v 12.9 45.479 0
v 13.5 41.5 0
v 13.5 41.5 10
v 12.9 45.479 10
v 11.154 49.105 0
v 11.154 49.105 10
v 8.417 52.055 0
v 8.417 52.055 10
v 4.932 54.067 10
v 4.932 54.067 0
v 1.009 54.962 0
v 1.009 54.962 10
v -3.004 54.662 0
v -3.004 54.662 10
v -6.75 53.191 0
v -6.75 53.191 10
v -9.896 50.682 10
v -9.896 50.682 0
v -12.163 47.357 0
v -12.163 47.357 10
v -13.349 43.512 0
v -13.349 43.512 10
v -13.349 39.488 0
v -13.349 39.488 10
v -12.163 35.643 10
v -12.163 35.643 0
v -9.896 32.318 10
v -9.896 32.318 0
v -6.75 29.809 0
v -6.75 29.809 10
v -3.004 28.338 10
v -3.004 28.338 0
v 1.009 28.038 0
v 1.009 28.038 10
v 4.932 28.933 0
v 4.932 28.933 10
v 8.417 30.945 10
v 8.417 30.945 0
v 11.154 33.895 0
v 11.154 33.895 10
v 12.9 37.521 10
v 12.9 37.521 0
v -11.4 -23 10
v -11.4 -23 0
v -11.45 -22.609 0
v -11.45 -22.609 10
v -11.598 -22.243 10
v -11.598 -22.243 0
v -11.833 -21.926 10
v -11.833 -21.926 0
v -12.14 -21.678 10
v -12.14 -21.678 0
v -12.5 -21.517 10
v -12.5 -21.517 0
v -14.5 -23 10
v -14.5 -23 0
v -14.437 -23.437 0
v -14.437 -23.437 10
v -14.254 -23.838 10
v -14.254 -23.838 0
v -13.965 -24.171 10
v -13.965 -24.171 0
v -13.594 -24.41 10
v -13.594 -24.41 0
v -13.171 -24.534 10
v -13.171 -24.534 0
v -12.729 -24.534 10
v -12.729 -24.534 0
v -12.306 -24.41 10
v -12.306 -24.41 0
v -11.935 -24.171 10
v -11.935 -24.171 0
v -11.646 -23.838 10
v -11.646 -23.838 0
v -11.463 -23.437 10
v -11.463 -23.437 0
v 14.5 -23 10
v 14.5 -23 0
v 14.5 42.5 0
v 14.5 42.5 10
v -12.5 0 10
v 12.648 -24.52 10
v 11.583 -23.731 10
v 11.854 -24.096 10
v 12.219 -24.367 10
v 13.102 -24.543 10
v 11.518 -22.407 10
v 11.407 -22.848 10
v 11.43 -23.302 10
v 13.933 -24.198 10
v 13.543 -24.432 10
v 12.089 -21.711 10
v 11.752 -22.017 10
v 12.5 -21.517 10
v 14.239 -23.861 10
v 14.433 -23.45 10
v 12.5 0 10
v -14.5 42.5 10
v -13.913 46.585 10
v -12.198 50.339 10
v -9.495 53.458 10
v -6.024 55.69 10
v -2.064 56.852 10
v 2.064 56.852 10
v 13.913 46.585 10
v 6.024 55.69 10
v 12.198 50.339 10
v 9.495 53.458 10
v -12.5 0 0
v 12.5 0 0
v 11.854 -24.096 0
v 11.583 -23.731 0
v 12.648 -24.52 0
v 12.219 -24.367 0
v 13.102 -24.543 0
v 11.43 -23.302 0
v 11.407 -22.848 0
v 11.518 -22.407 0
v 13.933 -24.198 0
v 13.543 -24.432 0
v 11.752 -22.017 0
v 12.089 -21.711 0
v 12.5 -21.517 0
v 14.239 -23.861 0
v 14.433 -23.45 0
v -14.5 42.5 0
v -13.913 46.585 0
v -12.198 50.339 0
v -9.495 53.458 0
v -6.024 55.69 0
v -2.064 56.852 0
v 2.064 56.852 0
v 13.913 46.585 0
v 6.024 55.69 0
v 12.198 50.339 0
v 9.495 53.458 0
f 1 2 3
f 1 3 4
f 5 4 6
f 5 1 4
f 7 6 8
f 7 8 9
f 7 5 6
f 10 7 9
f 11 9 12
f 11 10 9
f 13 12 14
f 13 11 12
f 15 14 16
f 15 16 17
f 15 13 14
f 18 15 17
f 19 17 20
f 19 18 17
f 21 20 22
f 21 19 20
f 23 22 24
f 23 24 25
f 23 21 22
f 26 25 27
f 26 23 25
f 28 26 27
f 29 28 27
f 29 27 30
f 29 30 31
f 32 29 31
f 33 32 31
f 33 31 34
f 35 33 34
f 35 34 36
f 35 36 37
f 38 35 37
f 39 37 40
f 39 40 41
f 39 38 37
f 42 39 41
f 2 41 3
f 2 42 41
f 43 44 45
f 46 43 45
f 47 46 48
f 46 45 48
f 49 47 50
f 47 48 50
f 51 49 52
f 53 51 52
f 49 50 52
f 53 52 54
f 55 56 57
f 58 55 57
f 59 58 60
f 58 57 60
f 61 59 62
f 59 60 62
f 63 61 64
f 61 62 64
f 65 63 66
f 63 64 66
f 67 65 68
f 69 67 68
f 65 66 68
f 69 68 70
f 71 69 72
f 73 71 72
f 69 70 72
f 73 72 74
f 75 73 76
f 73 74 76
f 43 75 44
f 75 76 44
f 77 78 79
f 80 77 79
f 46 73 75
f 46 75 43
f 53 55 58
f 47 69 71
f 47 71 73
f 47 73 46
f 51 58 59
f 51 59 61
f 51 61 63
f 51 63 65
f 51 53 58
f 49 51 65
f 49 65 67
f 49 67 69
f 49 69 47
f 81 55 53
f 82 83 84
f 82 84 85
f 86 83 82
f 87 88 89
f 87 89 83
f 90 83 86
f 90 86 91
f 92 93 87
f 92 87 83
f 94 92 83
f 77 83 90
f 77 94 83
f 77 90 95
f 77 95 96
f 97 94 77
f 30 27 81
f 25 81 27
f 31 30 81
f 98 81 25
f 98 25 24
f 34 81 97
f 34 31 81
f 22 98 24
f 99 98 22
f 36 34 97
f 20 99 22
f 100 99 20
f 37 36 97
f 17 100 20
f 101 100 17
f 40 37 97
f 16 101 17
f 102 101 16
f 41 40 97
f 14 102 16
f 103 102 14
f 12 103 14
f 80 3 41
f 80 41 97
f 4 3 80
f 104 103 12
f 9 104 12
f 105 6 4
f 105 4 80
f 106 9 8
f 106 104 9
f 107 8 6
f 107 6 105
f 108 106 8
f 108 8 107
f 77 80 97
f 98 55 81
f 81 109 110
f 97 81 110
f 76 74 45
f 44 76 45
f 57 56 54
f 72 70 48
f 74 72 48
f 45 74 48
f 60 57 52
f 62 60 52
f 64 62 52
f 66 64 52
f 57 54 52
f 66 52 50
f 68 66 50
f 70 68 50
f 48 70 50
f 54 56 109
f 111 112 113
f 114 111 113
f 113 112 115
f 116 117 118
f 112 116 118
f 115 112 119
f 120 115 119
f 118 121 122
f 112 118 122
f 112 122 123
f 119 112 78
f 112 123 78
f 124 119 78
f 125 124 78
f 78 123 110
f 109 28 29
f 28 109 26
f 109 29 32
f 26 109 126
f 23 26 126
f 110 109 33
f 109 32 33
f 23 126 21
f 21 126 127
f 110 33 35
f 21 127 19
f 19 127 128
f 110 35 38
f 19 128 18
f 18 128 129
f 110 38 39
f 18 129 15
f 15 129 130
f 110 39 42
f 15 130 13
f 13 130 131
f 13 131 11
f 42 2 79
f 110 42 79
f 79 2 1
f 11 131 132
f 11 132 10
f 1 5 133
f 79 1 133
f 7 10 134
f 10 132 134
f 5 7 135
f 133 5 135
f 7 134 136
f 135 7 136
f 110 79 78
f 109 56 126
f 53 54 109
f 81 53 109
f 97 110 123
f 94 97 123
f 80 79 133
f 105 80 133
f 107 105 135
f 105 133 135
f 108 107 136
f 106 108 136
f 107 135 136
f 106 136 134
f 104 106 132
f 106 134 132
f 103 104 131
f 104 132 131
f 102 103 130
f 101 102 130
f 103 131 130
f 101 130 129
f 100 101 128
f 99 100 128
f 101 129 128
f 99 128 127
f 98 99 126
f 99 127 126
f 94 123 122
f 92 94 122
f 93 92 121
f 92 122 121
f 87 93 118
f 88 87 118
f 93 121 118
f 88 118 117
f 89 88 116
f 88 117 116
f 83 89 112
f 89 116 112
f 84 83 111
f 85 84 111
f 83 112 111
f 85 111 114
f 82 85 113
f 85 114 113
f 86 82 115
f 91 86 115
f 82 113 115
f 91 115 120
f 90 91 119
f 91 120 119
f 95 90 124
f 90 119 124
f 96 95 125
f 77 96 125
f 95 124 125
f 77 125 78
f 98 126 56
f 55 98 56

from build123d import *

# Parameters (mm, degrees)
F2_DEPTH = 10
F1_R     = 13.5
F3_DEPTH = 10


with BuildPart() as f2:
    # F0 (on Top) → F2 (new body)
    with BuildSketch(Plane.XY):
        Polygon((-12.5, 0), (12.5, 0), (14.5, 0), (14.5, 28), (0, 28), (-14.5, 28), (-14.5, 0), align=None)
        with BuildLine():
            Line((14.5, 0), (12.5, 0))
            Line((12.5, 0), (12.5, -21.5167603026))
            ThreePointArc((12.5, -21.5167603026), (13.8733092656, -21.7550100402), (14.5, -23))
            Line((14.5, -23), (14.5, 0))
        make_face()
        with BuildLine():
            ThreePointArc((14.5, -23), (13.8733092656, -21.7550100402), (12.5, -21.5167603026))
            Line((12.5, -21.5167603026), (12.5, -23))
            Line((12.5, -23), (14.5, -23))
        make_face()
        with BuildLine():
            Line((12.5, -23), (12.5, -21.5167603026))
            ThreePointArc((12.5, -21.5167603026), (12.0266907344, -24.2449899598), (14.5, -23))
            Line((14.5, -23), (12.5, -23))
        make_face()
        with BuildLine():
            Line((-12.5, -21.5167603026), (-12.5, 0))
            Line((-12.5, 0), (-14.5, 0))
            Line((-14.5, 0), (-14.5, -23))
            ThreePointArc((-14.5, -23), (-13.8733092656, -21.7550100402), (-12.5, -21.5167603026))
        make_face()
        with BuildLine():
            Line((0, 28), (14.5, 28))
            Line((14.5, 28), (14.5, 42.5))
            ThreePointArc((14.5, 42.5), (10.2530483272, 32.2469516728), (0, 28))
        make_face()
        with BuildLine():
            ThreePointArc((-11.4, -23), (-11.7050100402, -22.0766907344), (-12.5, -21.5167603026))
            Line((-12.5, -21.5167603026), (-12.5, -23))
            Line((-12.5, -23), (-14.5, -23))
            ThreePointArc((-14.5, -23), (-12.95, -24.55), (-11.4, -23))
        make_face()
        with BuildLine():
            Line((-12.5, -23), (-12.5, -21.5167603026))
            ThreePointArc((-12.5, -21.5167603026), (-13.8733092656, -21.7550100402), (-14.5, -23))
            Line((-14.5, -23), (-12.5, -23))
        make_face()
        with BuildLine():
            Line((-14.5, 28), (0, 28))
            ThreePointArc((0, 28), (-10.2530483272, 32.2469516728), (-14.5, 42.5))
            Line((-14.5, 42.5), (-14.5, 28))
        make_face()
        with BuildLine():
            ThreePointArc((-14.5, 42.5), (-10.2530483272, 32.2469516728), (0, 28))
            ThreePointArc((0, 28), (10.2530483272, 32.2469516728), (14.5, 42.5))
            ThreePointArc((14.5, 42.5), (0, 57), (-14.5, 42.5))
        make_face()
    extrude(amount=F2_DEPTH)

    # F1 (on Top) → F3 (cut)
    with BuildSketch(Plane.XY):
        with Locations((0, 41.5)):
            Circle(F1_R)
    extrude(amount=F3_DEPTH, mode=Mode.SUBTRACT)


solid = f2.part
